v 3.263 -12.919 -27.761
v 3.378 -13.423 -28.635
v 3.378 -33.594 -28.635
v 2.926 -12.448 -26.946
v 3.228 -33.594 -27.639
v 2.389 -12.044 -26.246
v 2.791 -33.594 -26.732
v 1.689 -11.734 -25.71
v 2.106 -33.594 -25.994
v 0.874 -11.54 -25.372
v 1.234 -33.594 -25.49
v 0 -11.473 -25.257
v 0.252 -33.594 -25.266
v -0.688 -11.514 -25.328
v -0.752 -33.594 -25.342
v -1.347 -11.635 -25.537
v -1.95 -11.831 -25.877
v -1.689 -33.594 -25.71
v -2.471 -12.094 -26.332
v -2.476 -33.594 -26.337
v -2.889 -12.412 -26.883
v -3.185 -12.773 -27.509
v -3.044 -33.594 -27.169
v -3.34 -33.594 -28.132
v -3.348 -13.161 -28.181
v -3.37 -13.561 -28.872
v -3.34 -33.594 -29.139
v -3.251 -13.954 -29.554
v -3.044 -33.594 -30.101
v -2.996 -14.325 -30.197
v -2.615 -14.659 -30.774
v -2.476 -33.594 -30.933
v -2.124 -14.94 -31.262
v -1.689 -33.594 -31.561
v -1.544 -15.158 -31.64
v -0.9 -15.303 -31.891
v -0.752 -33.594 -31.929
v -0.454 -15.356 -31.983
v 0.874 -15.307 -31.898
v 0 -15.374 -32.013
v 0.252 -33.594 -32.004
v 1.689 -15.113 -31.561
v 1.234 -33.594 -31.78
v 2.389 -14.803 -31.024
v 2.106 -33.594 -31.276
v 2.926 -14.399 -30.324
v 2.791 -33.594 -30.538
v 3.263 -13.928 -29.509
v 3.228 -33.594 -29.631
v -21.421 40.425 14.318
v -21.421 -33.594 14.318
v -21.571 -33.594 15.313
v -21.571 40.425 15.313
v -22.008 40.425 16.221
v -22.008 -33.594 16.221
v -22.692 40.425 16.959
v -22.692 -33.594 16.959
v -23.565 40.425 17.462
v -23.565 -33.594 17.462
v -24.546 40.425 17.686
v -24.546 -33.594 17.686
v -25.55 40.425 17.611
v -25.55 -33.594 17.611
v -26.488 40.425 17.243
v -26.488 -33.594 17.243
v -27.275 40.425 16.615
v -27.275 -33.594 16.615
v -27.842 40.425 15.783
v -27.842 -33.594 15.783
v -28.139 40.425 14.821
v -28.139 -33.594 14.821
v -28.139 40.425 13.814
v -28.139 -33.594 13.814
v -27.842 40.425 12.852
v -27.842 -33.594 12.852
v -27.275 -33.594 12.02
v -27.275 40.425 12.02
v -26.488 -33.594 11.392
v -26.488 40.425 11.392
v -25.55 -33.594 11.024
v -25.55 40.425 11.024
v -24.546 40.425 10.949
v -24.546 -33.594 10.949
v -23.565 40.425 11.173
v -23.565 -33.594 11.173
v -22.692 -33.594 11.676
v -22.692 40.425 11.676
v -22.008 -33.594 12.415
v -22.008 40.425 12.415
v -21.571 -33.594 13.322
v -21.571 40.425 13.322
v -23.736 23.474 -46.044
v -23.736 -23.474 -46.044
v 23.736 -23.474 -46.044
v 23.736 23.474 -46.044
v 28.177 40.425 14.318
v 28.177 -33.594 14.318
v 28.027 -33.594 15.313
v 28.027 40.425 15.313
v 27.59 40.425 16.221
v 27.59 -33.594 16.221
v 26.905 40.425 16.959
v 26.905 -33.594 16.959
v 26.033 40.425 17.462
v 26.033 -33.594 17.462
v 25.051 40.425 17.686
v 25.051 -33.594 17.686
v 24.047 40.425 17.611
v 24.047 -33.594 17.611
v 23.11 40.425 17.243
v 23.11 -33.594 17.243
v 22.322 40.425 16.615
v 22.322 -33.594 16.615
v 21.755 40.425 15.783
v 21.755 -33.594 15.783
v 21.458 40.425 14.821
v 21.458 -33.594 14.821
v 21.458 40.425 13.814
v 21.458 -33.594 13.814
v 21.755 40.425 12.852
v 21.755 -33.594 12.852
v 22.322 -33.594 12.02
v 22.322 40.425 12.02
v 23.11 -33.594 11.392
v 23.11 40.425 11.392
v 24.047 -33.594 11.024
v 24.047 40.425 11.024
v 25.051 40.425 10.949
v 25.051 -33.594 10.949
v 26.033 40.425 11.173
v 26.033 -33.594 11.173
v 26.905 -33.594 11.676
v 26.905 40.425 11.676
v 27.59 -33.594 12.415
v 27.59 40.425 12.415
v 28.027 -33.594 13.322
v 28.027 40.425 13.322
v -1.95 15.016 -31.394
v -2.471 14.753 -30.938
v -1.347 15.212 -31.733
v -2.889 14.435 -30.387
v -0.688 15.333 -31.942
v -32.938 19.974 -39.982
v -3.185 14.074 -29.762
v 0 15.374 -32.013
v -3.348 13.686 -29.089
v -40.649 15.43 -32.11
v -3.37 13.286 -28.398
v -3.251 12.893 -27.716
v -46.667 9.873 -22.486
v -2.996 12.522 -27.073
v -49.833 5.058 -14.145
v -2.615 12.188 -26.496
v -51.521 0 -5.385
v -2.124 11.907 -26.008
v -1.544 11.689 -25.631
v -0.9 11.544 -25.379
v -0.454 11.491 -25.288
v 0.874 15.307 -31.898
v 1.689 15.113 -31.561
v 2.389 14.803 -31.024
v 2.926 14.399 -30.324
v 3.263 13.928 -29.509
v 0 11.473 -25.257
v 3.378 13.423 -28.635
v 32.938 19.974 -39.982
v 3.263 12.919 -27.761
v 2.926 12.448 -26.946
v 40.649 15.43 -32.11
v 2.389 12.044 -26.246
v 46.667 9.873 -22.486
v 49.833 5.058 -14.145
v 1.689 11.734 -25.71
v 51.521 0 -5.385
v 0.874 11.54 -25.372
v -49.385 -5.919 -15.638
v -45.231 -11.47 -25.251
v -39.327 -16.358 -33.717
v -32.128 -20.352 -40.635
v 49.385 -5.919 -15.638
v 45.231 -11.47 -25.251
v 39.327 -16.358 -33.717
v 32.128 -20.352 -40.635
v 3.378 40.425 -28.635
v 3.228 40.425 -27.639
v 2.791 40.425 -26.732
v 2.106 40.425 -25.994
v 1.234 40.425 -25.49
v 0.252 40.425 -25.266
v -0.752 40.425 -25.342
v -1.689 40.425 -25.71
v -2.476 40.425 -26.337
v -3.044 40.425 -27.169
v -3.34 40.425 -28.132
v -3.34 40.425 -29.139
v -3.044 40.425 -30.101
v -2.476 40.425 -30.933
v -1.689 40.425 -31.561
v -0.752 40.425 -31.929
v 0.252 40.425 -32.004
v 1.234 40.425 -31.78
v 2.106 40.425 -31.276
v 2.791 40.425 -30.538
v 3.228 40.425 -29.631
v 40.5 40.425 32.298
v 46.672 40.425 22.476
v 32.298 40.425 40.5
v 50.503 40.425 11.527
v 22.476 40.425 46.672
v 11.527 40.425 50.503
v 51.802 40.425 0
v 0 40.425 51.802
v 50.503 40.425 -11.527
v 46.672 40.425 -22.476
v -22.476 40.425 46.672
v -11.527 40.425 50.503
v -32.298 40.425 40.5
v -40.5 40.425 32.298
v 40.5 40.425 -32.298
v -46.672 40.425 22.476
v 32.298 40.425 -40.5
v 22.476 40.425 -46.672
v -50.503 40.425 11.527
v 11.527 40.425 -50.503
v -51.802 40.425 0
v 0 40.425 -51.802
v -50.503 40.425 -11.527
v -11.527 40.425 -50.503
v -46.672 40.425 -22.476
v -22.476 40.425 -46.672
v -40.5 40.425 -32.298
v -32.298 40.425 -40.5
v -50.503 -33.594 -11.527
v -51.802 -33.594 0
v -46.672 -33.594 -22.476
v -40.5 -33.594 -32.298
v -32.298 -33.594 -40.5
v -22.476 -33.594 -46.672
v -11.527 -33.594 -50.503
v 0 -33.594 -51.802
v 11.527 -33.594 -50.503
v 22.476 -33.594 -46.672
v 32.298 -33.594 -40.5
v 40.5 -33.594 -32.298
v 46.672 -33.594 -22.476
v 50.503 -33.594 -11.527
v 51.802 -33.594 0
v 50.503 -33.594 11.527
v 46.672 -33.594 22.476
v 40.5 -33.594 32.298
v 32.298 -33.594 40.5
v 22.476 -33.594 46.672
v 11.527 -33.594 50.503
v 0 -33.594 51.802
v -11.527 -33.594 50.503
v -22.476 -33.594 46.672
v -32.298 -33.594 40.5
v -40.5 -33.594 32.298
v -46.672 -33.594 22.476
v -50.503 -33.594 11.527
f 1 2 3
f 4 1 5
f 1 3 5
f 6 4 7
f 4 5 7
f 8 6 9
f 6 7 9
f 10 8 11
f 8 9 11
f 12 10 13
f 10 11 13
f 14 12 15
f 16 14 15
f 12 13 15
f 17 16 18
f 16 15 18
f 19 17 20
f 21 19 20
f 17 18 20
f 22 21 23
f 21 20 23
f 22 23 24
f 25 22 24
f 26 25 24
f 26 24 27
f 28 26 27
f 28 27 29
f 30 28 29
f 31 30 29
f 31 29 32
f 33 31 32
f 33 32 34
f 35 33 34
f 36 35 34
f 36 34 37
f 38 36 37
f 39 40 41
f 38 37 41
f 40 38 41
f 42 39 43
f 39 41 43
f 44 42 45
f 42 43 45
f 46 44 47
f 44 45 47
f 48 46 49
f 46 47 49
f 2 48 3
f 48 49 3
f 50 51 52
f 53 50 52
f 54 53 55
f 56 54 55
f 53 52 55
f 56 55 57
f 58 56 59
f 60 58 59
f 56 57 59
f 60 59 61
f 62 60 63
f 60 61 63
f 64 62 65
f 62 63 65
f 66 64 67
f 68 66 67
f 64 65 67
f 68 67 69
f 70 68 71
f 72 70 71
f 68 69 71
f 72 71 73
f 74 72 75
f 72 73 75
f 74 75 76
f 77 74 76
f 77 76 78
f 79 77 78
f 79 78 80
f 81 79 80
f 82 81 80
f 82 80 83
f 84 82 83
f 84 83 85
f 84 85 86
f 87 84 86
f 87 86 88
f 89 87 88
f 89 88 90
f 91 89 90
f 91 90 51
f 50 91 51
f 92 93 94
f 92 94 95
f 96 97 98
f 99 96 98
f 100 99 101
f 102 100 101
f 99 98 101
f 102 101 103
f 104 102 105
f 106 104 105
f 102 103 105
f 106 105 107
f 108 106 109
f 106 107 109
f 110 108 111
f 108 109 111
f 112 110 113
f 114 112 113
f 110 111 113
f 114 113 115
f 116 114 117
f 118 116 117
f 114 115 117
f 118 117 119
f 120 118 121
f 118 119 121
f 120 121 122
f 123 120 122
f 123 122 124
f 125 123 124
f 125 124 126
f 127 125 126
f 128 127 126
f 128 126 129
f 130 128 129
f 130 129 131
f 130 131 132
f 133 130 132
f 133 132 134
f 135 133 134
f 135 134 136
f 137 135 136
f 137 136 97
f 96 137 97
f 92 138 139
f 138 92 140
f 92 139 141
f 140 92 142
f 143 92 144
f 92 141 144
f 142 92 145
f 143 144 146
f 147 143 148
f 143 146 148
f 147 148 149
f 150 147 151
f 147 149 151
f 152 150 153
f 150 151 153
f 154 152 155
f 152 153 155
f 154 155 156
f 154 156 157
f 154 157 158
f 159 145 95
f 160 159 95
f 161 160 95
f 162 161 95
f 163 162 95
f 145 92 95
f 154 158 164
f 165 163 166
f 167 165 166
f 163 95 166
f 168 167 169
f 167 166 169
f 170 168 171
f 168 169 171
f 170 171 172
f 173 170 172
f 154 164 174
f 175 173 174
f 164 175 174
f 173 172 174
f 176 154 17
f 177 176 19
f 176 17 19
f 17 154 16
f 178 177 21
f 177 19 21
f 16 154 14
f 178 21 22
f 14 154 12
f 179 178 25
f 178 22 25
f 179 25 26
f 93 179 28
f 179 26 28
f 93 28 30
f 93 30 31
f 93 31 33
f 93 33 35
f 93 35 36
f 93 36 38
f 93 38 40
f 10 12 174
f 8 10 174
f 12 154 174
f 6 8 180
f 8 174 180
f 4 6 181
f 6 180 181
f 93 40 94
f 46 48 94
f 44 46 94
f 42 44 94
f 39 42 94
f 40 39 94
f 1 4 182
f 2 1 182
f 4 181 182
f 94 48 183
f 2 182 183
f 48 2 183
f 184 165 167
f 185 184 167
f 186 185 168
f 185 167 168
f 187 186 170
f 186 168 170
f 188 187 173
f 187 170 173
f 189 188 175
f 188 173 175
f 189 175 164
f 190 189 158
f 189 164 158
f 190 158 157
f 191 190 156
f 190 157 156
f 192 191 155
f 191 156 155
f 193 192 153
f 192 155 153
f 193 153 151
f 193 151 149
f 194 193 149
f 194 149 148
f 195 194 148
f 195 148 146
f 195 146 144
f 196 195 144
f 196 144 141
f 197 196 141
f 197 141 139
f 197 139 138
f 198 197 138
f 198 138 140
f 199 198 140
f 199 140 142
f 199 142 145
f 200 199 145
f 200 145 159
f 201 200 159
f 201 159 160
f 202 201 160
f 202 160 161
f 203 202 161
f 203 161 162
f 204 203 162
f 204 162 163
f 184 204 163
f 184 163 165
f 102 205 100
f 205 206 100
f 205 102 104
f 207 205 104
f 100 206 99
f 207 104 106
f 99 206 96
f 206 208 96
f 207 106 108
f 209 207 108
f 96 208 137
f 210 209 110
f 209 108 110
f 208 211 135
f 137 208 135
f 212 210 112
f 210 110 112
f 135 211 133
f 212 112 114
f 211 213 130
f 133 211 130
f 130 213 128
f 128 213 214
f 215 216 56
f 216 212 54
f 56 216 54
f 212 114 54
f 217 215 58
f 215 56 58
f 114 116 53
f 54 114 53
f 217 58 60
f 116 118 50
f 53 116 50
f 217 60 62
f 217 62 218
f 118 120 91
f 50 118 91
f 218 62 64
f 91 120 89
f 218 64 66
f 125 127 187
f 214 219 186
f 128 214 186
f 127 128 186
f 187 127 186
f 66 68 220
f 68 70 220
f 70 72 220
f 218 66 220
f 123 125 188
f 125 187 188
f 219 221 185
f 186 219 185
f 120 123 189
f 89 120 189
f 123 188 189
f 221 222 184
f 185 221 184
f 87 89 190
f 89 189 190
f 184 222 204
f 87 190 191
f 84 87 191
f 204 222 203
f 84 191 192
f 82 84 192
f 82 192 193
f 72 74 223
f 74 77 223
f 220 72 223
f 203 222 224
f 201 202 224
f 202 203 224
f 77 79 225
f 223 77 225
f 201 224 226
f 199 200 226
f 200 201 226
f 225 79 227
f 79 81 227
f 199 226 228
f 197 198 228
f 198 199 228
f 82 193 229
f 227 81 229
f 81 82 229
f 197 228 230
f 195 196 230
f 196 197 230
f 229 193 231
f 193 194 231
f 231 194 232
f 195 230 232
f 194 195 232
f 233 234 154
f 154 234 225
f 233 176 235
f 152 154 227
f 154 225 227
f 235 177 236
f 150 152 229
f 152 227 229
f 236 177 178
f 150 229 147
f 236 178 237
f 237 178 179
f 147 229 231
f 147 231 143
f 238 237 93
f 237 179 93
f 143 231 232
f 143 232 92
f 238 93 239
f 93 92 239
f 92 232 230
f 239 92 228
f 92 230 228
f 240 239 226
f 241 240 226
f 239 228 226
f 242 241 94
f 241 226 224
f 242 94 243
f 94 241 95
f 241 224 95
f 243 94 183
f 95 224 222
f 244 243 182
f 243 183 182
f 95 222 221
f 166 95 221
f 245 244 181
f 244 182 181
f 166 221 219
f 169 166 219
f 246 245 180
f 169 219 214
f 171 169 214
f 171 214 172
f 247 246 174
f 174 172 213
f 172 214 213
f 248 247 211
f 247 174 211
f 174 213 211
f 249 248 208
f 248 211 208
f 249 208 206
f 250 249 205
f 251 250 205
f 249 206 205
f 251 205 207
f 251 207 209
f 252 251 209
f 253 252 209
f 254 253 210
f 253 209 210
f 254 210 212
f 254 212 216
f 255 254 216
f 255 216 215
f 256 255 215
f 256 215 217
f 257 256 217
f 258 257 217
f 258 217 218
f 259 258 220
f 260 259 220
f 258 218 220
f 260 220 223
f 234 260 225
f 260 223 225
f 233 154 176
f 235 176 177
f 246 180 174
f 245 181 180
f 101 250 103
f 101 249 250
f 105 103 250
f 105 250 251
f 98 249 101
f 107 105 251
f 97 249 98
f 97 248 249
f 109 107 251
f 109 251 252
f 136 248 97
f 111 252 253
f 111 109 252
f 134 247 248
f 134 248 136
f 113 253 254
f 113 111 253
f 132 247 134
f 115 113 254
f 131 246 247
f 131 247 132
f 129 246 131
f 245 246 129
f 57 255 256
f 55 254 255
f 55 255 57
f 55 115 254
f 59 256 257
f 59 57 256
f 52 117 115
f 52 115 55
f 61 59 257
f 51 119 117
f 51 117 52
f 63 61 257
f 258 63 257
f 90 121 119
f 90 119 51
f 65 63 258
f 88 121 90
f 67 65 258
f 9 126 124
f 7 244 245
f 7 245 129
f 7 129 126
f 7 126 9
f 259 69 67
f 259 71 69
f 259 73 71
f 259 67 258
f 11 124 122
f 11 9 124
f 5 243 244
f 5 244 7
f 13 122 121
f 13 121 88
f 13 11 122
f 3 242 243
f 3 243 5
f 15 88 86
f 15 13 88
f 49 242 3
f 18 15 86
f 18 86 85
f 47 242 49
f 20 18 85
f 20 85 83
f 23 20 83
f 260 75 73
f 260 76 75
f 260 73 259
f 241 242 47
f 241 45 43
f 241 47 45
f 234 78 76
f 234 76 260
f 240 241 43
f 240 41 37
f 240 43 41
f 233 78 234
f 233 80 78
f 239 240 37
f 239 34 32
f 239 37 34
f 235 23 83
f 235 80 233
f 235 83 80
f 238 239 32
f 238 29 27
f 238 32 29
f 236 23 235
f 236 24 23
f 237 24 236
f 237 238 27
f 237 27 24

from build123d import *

# Parameters (mm, degrees)
F0_W          = 51.8020391464
F0_H          = 74.018985033
F3_D          = 6.7564
F5_DEPTH      = 51.8030391464
F5_DEPTH_BACK = 51.8030391464


with BuildPart() as f1:
    # F0 (on Top) → F1 (revolve)
    with BuildSketch(Plane.XY):
        with Locations((-25.9010195732, 3.415748477)):
            Rectangle(F0_W, F0_H)
    revolve(axis=Axis((0, 3.415748477, 0), (0, -1, 0)))

    # F3 (through all)
    with Locations(Plane(origin=(0, 40.4252409935, 0), x_dir=(-1, 0, 0), z_dir=(0, 1, 0))):
        with Locations((-24.7987365379, 14.3175572157), (0, -28.6351144314), (24.7987365379, 14.3175572157)):
            Hole(F3_D / 2)

    # F4 (on Right) → F5 (cut, two sides)
    with BuildSketch(Plane.YZ) as f5_sk:
        Polygon((-23.4744153275, -46.0438393056), (23.4744153275, -46.0438393056), (0, -5.3849592805), align=None)
    extrude(amount=F5_DEPTH, mode=Mode.SUBTRACT)
    extrude(f5_sk.sketch, amount=-F5_DEPTH_BACK, mode=Mode.SUBTRACT)


solid = f1.part
